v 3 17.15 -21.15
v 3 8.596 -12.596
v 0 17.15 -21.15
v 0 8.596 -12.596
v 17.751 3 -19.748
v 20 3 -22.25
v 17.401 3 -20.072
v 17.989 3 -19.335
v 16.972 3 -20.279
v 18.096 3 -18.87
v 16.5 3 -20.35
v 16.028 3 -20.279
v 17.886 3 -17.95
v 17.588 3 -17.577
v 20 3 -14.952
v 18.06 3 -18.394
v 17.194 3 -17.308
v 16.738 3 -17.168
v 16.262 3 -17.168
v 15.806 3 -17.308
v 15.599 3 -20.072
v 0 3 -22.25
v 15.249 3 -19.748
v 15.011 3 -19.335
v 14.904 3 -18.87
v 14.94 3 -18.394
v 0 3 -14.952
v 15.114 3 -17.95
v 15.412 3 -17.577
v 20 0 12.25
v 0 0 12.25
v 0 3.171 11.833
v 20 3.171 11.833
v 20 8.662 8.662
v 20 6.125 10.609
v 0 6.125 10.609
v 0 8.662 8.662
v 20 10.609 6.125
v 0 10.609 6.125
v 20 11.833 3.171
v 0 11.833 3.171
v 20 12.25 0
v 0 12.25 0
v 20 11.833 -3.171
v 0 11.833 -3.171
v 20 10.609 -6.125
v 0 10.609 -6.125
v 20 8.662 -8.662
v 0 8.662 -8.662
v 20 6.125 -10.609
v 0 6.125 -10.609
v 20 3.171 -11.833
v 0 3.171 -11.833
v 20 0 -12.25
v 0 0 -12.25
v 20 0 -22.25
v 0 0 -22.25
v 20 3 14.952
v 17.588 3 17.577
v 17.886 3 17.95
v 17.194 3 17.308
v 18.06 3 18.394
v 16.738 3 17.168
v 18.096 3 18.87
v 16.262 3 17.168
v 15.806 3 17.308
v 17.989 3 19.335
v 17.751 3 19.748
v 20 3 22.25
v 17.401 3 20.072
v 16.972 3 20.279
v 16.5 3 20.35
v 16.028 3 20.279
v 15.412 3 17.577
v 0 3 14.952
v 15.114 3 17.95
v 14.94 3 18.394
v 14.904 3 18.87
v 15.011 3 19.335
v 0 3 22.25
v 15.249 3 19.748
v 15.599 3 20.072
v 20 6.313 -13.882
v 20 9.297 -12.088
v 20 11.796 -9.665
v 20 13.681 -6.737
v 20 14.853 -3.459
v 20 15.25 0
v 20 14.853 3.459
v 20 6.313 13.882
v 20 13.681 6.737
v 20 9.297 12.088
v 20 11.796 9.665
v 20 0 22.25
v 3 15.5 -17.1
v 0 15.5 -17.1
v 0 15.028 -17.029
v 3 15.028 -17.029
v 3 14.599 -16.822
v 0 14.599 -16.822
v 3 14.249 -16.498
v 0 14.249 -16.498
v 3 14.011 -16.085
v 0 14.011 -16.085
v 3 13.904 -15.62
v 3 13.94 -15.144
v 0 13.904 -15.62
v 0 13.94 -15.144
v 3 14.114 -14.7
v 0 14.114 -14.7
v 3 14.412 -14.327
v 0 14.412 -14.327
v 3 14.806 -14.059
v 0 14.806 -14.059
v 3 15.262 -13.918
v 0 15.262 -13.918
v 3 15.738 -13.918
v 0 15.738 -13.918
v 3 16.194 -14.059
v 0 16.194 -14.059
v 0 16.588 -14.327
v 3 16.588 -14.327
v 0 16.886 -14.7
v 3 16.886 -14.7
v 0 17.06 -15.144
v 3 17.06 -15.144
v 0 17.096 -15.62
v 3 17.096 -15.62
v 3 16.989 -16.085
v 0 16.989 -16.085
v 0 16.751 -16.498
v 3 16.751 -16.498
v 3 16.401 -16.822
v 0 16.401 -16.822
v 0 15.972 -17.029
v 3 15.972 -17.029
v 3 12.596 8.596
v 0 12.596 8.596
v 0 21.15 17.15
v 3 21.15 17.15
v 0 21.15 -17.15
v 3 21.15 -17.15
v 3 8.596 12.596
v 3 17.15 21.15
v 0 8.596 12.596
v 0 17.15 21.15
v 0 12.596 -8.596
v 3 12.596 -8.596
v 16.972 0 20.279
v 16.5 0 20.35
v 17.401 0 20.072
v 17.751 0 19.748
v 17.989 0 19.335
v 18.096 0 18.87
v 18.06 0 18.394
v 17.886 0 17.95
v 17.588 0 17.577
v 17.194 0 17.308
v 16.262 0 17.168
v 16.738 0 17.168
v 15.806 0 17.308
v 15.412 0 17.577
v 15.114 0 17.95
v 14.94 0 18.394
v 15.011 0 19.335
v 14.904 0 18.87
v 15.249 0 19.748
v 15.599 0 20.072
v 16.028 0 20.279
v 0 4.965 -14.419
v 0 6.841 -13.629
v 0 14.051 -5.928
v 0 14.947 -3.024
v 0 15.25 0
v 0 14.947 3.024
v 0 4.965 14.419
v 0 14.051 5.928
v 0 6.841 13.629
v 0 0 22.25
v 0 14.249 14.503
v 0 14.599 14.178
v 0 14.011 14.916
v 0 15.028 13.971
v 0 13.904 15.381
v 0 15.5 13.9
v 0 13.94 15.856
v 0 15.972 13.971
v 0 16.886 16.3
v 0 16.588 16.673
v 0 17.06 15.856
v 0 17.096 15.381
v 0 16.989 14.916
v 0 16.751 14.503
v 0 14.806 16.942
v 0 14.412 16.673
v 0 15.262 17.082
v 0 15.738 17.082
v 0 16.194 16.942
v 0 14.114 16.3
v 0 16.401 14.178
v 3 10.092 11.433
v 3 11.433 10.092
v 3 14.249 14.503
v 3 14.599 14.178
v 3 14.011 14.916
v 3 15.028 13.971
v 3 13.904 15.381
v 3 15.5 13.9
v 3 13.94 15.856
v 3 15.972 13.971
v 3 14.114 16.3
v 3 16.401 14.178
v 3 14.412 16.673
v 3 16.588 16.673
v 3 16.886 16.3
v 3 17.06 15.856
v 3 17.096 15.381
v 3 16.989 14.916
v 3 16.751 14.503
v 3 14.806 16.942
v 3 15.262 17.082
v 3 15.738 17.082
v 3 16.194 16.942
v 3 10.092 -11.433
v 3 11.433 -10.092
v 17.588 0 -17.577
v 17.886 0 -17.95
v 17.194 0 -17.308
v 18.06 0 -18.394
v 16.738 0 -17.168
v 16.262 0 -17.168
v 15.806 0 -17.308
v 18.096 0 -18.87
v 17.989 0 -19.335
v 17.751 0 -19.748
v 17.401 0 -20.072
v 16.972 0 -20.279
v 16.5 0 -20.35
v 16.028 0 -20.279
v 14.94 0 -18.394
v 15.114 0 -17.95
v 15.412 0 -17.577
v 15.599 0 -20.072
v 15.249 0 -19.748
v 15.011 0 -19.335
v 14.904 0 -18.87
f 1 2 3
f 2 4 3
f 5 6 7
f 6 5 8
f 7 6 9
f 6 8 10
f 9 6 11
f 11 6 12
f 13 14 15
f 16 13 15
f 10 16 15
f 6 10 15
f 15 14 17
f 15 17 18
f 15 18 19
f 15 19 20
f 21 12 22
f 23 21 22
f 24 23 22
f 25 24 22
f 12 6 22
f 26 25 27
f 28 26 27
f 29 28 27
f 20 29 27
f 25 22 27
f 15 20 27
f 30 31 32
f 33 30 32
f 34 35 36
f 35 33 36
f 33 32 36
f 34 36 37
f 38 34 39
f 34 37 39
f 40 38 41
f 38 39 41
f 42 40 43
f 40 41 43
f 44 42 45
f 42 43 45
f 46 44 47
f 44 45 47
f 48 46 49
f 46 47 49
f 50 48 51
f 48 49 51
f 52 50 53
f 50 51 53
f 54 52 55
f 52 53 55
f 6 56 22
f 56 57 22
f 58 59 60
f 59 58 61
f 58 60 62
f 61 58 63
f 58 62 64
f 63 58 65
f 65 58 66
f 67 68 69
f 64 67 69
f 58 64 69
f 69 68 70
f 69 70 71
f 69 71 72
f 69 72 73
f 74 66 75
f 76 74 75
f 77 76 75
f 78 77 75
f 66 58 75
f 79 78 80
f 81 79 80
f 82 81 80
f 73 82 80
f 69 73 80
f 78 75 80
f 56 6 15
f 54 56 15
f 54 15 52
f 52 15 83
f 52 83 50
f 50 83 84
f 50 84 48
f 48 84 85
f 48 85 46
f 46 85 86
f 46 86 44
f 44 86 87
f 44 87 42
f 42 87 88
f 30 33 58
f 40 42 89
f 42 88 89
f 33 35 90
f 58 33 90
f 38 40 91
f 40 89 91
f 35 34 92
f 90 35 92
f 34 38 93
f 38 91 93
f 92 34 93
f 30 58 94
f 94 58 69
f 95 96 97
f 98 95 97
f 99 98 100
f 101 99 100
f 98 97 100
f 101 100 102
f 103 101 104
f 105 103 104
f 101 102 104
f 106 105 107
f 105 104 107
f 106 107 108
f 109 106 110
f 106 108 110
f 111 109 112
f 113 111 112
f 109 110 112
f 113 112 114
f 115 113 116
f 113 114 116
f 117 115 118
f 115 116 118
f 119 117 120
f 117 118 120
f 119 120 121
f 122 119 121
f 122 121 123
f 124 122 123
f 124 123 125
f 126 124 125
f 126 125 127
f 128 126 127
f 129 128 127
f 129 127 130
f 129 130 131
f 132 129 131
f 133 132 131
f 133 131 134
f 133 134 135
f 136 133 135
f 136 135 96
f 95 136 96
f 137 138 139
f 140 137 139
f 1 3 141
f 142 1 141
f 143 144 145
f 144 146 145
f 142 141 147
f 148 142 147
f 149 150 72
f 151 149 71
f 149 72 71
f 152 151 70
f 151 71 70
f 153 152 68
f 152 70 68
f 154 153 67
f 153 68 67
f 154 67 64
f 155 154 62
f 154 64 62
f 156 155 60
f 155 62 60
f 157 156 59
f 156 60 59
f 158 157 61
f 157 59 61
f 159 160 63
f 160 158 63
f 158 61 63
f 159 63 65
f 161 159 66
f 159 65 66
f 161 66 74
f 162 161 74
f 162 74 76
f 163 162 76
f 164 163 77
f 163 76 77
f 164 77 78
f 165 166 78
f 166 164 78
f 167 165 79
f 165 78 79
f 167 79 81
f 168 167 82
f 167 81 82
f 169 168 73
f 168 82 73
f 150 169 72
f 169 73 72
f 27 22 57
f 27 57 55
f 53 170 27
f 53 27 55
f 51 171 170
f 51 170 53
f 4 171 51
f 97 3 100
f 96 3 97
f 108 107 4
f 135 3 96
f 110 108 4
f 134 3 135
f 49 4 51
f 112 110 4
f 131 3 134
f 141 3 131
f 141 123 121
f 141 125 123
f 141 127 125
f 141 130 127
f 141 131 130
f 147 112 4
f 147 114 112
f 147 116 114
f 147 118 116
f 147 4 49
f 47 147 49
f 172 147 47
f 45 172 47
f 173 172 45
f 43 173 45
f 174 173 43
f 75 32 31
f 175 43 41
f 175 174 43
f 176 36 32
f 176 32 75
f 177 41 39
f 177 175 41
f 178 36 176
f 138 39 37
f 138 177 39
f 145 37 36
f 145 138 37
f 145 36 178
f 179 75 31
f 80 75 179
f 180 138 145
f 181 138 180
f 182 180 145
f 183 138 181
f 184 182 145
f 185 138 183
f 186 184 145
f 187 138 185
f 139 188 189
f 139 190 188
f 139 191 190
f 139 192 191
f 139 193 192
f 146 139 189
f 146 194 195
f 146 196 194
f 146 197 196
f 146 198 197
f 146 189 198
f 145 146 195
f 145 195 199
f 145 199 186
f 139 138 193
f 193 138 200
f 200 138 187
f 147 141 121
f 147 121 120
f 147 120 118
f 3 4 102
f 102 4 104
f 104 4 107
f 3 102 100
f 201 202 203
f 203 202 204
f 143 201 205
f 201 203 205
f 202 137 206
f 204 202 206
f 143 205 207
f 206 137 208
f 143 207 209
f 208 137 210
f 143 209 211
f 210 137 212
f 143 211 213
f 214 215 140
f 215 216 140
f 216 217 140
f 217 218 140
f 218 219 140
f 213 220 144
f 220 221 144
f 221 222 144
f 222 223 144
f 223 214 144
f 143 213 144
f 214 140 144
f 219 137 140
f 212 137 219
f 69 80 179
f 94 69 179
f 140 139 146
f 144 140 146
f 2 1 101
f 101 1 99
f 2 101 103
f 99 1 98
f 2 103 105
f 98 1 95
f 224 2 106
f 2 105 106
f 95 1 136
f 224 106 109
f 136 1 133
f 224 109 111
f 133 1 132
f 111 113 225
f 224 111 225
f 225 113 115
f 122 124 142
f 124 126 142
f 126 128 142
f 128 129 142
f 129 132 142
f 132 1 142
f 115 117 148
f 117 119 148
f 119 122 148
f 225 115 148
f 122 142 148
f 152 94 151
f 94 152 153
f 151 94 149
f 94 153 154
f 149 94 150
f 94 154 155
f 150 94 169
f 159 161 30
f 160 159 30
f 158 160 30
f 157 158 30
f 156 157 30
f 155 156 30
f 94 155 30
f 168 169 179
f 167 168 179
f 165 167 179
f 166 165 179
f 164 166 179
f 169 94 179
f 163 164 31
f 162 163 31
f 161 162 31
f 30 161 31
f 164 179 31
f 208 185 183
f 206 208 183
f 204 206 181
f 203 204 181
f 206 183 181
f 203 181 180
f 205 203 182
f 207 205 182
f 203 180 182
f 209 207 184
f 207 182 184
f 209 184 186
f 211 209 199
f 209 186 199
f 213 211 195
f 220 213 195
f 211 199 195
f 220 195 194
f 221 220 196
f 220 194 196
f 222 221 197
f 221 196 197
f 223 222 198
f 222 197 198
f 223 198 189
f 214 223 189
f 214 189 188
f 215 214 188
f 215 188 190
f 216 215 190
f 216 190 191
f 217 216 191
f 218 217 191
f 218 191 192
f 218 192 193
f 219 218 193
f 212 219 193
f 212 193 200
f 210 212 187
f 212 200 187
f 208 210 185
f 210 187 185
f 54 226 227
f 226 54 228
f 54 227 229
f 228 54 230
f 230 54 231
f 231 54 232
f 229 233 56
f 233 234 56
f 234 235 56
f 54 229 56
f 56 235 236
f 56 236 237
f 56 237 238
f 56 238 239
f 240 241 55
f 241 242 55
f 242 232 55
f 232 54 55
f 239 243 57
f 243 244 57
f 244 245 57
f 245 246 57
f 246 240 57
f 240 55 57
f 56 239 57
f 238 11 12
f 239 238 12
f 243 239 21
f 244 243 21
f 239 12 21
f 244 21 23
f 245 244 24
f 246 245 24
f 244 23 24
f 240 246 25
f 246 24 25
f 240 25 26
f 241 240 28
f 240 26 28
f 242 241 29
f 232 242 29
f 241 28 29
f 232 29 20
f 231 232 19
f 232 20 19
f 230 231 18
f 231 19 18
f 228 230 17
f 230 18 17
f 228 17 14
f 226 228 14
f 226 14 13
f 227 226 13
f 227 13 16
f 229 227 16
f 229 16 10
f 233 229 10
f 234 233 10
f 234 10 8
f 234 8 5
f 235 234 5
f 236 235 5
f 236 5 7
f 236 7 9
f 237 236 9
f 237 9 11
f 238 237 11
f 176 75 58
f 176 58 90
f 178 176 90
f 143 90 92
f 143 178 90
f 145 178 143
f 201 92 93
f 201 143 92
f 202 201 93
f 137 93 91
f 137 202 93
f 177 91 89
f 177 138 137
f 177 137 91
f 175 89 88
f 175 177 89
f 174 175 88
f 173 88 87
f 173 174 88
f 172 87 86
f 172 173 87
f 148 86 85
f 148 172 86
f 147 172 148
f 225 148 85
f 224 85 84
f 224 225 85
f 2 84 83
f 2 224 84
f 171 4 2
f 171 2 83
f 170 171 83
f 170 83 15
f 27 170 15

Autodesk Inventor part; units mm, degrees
ref_plane "YZ Plane" through (0, 0, 0) normal (1, 0, 0) x (0, 1, 0)
ref_plane "XZ Plane" through (0, 0, 0) normal (0, 1, 0) x (-1, 0, 0)
ref_plane "XY Plane" through (0, 0, 0) normal (0, 0, 1) x (1, 0, 0)
sketch "Skizze1" plane through (0, 0, 0) normal (1, 0, 0) x (0, 1, 0)
  arc A0 (0, -12.25) -> (0, 12.25) centre (0, 0) ccw
  arc A1 (0, -15.25) -> (0, 15.25) centre (0, 0) ccw
  line L0 (0, 15.25) -> (0, 12.25)
  line L1 (0, -12.25) -> (0, -15.25)
  dimension "d0" = 12.25
  dimension "d1" = 15.25
extrude "Extrusion1" add sketch "Skizze1" along normal blind 20
sketch "Skizze7" plane through (0, 0, 0) normal (-1, 0, 0) x (0, 0, 1)
  arc A0 (15.25, 0) -> (-15.25, 0) centre (0, 0) ccw projected
  line L0 (-12.5965, 8.596) -> (-21.1503, 17.1499)
  line L1 (-12.5965, 8.596) -> (-0.4995, 8.596) construction
  line L2 (-21.1503, 17.1499) -> (-17.1502, 21.15)
  line L3 (-17.1502, 21.15) -> (-8.596, 12.5965)
  arc A1 (-8.596, 12.5965) -> (-12.5965, 8.596) centre (0, 0) ccw
  dimension "d40" = 12.097
  dimension "d41" = 135
  dimension "d42" = 8.596
  dimension "d43" = 5.657
extrude "Extrusion4" add sketch "Skizze7" against normal blind 3
mirror "Spiegeln4" about plane through (0, 0, 0) normal (0, 0, 1) of "Extrusion4"
sketch "Skizze8" plane through (3, 21.15, 17.1502) normal (1, 0, 0) x (0, -0.7071, -0.7071)
  line L0 (-0.0002, -5.657) -> (0, 0) projected
  line L1 (29.9122, 24.2528) -> (24.2552, 24.253) projected
  line L2 (24.2552, 24.253) -> (24.2541, 12.156) projected
  line L3 (0, 0) -> (12.097, 0) projected
  point P0 (27.0822, -2.8294)
  point P1 (5.1619, -2.8285)
  point P2 (27.0832, 19.0909)
  point P3 (27.0837, 24.2529)
  dimension "d53" = 5.162
  dimension "d54" = 5.162
  dimension "d55" = 2.8285
  dimension "d56" = 2.8285
hole "Bohrung3" at (3, 15.5, 15.5001) at (3, 15.5, -15.5001) direction (-1, 0, 0) diameter 3.2 end through all
sketch "Skizze9" plane through (0, 0, 0) normal (-1, 0, 0) x (0, 0, 1)
  line L0 (-12.25, 0) -> (-15.25, 0) projected
  line L1 (-15.25, 0) -> (-22.25, 0)
  line L2 (-22.25, 0) -> (-22.25, 3)
  line L3 (-22.25, 3) -> (-14.952, 3)
  arc A0 (-12.5965, 8.596) -> (-15.25, 0) centre (0, 0) ccw projected
  arc A1 (-14.952, 3) -> (-15.25, 0) centre (0, 0) ccw
  dimension "d57" = 7
  dimension "d58" = 3
extrude "Extrusion5" add sketch "Skizze9" against normal blind 20
sketch "Skizze10" plane through (0, 0, -12.25) normal (0, -1, 0) x (1, 0, 0)
  line L0 (20, 0) -> (20, -10) projected
  line L1 (0, -10) -> (20, -10) projected
  point P0 (0, 12.25)
  point P1 (16.5, -6.5)
  dimension "d68" = 3.5
  dimension "d69" = 3.5
hole "Bohrung4" at (16.5, 0, -18.75) direction (0, 1, 0) diameter 3.2 end through all
mirror "Spiegeln5" about plane through (0, 0, 0) normal (0, 0, 1) of "Extrusion5", "Bohrung4"
properties part number "SensorHalterSchale"
